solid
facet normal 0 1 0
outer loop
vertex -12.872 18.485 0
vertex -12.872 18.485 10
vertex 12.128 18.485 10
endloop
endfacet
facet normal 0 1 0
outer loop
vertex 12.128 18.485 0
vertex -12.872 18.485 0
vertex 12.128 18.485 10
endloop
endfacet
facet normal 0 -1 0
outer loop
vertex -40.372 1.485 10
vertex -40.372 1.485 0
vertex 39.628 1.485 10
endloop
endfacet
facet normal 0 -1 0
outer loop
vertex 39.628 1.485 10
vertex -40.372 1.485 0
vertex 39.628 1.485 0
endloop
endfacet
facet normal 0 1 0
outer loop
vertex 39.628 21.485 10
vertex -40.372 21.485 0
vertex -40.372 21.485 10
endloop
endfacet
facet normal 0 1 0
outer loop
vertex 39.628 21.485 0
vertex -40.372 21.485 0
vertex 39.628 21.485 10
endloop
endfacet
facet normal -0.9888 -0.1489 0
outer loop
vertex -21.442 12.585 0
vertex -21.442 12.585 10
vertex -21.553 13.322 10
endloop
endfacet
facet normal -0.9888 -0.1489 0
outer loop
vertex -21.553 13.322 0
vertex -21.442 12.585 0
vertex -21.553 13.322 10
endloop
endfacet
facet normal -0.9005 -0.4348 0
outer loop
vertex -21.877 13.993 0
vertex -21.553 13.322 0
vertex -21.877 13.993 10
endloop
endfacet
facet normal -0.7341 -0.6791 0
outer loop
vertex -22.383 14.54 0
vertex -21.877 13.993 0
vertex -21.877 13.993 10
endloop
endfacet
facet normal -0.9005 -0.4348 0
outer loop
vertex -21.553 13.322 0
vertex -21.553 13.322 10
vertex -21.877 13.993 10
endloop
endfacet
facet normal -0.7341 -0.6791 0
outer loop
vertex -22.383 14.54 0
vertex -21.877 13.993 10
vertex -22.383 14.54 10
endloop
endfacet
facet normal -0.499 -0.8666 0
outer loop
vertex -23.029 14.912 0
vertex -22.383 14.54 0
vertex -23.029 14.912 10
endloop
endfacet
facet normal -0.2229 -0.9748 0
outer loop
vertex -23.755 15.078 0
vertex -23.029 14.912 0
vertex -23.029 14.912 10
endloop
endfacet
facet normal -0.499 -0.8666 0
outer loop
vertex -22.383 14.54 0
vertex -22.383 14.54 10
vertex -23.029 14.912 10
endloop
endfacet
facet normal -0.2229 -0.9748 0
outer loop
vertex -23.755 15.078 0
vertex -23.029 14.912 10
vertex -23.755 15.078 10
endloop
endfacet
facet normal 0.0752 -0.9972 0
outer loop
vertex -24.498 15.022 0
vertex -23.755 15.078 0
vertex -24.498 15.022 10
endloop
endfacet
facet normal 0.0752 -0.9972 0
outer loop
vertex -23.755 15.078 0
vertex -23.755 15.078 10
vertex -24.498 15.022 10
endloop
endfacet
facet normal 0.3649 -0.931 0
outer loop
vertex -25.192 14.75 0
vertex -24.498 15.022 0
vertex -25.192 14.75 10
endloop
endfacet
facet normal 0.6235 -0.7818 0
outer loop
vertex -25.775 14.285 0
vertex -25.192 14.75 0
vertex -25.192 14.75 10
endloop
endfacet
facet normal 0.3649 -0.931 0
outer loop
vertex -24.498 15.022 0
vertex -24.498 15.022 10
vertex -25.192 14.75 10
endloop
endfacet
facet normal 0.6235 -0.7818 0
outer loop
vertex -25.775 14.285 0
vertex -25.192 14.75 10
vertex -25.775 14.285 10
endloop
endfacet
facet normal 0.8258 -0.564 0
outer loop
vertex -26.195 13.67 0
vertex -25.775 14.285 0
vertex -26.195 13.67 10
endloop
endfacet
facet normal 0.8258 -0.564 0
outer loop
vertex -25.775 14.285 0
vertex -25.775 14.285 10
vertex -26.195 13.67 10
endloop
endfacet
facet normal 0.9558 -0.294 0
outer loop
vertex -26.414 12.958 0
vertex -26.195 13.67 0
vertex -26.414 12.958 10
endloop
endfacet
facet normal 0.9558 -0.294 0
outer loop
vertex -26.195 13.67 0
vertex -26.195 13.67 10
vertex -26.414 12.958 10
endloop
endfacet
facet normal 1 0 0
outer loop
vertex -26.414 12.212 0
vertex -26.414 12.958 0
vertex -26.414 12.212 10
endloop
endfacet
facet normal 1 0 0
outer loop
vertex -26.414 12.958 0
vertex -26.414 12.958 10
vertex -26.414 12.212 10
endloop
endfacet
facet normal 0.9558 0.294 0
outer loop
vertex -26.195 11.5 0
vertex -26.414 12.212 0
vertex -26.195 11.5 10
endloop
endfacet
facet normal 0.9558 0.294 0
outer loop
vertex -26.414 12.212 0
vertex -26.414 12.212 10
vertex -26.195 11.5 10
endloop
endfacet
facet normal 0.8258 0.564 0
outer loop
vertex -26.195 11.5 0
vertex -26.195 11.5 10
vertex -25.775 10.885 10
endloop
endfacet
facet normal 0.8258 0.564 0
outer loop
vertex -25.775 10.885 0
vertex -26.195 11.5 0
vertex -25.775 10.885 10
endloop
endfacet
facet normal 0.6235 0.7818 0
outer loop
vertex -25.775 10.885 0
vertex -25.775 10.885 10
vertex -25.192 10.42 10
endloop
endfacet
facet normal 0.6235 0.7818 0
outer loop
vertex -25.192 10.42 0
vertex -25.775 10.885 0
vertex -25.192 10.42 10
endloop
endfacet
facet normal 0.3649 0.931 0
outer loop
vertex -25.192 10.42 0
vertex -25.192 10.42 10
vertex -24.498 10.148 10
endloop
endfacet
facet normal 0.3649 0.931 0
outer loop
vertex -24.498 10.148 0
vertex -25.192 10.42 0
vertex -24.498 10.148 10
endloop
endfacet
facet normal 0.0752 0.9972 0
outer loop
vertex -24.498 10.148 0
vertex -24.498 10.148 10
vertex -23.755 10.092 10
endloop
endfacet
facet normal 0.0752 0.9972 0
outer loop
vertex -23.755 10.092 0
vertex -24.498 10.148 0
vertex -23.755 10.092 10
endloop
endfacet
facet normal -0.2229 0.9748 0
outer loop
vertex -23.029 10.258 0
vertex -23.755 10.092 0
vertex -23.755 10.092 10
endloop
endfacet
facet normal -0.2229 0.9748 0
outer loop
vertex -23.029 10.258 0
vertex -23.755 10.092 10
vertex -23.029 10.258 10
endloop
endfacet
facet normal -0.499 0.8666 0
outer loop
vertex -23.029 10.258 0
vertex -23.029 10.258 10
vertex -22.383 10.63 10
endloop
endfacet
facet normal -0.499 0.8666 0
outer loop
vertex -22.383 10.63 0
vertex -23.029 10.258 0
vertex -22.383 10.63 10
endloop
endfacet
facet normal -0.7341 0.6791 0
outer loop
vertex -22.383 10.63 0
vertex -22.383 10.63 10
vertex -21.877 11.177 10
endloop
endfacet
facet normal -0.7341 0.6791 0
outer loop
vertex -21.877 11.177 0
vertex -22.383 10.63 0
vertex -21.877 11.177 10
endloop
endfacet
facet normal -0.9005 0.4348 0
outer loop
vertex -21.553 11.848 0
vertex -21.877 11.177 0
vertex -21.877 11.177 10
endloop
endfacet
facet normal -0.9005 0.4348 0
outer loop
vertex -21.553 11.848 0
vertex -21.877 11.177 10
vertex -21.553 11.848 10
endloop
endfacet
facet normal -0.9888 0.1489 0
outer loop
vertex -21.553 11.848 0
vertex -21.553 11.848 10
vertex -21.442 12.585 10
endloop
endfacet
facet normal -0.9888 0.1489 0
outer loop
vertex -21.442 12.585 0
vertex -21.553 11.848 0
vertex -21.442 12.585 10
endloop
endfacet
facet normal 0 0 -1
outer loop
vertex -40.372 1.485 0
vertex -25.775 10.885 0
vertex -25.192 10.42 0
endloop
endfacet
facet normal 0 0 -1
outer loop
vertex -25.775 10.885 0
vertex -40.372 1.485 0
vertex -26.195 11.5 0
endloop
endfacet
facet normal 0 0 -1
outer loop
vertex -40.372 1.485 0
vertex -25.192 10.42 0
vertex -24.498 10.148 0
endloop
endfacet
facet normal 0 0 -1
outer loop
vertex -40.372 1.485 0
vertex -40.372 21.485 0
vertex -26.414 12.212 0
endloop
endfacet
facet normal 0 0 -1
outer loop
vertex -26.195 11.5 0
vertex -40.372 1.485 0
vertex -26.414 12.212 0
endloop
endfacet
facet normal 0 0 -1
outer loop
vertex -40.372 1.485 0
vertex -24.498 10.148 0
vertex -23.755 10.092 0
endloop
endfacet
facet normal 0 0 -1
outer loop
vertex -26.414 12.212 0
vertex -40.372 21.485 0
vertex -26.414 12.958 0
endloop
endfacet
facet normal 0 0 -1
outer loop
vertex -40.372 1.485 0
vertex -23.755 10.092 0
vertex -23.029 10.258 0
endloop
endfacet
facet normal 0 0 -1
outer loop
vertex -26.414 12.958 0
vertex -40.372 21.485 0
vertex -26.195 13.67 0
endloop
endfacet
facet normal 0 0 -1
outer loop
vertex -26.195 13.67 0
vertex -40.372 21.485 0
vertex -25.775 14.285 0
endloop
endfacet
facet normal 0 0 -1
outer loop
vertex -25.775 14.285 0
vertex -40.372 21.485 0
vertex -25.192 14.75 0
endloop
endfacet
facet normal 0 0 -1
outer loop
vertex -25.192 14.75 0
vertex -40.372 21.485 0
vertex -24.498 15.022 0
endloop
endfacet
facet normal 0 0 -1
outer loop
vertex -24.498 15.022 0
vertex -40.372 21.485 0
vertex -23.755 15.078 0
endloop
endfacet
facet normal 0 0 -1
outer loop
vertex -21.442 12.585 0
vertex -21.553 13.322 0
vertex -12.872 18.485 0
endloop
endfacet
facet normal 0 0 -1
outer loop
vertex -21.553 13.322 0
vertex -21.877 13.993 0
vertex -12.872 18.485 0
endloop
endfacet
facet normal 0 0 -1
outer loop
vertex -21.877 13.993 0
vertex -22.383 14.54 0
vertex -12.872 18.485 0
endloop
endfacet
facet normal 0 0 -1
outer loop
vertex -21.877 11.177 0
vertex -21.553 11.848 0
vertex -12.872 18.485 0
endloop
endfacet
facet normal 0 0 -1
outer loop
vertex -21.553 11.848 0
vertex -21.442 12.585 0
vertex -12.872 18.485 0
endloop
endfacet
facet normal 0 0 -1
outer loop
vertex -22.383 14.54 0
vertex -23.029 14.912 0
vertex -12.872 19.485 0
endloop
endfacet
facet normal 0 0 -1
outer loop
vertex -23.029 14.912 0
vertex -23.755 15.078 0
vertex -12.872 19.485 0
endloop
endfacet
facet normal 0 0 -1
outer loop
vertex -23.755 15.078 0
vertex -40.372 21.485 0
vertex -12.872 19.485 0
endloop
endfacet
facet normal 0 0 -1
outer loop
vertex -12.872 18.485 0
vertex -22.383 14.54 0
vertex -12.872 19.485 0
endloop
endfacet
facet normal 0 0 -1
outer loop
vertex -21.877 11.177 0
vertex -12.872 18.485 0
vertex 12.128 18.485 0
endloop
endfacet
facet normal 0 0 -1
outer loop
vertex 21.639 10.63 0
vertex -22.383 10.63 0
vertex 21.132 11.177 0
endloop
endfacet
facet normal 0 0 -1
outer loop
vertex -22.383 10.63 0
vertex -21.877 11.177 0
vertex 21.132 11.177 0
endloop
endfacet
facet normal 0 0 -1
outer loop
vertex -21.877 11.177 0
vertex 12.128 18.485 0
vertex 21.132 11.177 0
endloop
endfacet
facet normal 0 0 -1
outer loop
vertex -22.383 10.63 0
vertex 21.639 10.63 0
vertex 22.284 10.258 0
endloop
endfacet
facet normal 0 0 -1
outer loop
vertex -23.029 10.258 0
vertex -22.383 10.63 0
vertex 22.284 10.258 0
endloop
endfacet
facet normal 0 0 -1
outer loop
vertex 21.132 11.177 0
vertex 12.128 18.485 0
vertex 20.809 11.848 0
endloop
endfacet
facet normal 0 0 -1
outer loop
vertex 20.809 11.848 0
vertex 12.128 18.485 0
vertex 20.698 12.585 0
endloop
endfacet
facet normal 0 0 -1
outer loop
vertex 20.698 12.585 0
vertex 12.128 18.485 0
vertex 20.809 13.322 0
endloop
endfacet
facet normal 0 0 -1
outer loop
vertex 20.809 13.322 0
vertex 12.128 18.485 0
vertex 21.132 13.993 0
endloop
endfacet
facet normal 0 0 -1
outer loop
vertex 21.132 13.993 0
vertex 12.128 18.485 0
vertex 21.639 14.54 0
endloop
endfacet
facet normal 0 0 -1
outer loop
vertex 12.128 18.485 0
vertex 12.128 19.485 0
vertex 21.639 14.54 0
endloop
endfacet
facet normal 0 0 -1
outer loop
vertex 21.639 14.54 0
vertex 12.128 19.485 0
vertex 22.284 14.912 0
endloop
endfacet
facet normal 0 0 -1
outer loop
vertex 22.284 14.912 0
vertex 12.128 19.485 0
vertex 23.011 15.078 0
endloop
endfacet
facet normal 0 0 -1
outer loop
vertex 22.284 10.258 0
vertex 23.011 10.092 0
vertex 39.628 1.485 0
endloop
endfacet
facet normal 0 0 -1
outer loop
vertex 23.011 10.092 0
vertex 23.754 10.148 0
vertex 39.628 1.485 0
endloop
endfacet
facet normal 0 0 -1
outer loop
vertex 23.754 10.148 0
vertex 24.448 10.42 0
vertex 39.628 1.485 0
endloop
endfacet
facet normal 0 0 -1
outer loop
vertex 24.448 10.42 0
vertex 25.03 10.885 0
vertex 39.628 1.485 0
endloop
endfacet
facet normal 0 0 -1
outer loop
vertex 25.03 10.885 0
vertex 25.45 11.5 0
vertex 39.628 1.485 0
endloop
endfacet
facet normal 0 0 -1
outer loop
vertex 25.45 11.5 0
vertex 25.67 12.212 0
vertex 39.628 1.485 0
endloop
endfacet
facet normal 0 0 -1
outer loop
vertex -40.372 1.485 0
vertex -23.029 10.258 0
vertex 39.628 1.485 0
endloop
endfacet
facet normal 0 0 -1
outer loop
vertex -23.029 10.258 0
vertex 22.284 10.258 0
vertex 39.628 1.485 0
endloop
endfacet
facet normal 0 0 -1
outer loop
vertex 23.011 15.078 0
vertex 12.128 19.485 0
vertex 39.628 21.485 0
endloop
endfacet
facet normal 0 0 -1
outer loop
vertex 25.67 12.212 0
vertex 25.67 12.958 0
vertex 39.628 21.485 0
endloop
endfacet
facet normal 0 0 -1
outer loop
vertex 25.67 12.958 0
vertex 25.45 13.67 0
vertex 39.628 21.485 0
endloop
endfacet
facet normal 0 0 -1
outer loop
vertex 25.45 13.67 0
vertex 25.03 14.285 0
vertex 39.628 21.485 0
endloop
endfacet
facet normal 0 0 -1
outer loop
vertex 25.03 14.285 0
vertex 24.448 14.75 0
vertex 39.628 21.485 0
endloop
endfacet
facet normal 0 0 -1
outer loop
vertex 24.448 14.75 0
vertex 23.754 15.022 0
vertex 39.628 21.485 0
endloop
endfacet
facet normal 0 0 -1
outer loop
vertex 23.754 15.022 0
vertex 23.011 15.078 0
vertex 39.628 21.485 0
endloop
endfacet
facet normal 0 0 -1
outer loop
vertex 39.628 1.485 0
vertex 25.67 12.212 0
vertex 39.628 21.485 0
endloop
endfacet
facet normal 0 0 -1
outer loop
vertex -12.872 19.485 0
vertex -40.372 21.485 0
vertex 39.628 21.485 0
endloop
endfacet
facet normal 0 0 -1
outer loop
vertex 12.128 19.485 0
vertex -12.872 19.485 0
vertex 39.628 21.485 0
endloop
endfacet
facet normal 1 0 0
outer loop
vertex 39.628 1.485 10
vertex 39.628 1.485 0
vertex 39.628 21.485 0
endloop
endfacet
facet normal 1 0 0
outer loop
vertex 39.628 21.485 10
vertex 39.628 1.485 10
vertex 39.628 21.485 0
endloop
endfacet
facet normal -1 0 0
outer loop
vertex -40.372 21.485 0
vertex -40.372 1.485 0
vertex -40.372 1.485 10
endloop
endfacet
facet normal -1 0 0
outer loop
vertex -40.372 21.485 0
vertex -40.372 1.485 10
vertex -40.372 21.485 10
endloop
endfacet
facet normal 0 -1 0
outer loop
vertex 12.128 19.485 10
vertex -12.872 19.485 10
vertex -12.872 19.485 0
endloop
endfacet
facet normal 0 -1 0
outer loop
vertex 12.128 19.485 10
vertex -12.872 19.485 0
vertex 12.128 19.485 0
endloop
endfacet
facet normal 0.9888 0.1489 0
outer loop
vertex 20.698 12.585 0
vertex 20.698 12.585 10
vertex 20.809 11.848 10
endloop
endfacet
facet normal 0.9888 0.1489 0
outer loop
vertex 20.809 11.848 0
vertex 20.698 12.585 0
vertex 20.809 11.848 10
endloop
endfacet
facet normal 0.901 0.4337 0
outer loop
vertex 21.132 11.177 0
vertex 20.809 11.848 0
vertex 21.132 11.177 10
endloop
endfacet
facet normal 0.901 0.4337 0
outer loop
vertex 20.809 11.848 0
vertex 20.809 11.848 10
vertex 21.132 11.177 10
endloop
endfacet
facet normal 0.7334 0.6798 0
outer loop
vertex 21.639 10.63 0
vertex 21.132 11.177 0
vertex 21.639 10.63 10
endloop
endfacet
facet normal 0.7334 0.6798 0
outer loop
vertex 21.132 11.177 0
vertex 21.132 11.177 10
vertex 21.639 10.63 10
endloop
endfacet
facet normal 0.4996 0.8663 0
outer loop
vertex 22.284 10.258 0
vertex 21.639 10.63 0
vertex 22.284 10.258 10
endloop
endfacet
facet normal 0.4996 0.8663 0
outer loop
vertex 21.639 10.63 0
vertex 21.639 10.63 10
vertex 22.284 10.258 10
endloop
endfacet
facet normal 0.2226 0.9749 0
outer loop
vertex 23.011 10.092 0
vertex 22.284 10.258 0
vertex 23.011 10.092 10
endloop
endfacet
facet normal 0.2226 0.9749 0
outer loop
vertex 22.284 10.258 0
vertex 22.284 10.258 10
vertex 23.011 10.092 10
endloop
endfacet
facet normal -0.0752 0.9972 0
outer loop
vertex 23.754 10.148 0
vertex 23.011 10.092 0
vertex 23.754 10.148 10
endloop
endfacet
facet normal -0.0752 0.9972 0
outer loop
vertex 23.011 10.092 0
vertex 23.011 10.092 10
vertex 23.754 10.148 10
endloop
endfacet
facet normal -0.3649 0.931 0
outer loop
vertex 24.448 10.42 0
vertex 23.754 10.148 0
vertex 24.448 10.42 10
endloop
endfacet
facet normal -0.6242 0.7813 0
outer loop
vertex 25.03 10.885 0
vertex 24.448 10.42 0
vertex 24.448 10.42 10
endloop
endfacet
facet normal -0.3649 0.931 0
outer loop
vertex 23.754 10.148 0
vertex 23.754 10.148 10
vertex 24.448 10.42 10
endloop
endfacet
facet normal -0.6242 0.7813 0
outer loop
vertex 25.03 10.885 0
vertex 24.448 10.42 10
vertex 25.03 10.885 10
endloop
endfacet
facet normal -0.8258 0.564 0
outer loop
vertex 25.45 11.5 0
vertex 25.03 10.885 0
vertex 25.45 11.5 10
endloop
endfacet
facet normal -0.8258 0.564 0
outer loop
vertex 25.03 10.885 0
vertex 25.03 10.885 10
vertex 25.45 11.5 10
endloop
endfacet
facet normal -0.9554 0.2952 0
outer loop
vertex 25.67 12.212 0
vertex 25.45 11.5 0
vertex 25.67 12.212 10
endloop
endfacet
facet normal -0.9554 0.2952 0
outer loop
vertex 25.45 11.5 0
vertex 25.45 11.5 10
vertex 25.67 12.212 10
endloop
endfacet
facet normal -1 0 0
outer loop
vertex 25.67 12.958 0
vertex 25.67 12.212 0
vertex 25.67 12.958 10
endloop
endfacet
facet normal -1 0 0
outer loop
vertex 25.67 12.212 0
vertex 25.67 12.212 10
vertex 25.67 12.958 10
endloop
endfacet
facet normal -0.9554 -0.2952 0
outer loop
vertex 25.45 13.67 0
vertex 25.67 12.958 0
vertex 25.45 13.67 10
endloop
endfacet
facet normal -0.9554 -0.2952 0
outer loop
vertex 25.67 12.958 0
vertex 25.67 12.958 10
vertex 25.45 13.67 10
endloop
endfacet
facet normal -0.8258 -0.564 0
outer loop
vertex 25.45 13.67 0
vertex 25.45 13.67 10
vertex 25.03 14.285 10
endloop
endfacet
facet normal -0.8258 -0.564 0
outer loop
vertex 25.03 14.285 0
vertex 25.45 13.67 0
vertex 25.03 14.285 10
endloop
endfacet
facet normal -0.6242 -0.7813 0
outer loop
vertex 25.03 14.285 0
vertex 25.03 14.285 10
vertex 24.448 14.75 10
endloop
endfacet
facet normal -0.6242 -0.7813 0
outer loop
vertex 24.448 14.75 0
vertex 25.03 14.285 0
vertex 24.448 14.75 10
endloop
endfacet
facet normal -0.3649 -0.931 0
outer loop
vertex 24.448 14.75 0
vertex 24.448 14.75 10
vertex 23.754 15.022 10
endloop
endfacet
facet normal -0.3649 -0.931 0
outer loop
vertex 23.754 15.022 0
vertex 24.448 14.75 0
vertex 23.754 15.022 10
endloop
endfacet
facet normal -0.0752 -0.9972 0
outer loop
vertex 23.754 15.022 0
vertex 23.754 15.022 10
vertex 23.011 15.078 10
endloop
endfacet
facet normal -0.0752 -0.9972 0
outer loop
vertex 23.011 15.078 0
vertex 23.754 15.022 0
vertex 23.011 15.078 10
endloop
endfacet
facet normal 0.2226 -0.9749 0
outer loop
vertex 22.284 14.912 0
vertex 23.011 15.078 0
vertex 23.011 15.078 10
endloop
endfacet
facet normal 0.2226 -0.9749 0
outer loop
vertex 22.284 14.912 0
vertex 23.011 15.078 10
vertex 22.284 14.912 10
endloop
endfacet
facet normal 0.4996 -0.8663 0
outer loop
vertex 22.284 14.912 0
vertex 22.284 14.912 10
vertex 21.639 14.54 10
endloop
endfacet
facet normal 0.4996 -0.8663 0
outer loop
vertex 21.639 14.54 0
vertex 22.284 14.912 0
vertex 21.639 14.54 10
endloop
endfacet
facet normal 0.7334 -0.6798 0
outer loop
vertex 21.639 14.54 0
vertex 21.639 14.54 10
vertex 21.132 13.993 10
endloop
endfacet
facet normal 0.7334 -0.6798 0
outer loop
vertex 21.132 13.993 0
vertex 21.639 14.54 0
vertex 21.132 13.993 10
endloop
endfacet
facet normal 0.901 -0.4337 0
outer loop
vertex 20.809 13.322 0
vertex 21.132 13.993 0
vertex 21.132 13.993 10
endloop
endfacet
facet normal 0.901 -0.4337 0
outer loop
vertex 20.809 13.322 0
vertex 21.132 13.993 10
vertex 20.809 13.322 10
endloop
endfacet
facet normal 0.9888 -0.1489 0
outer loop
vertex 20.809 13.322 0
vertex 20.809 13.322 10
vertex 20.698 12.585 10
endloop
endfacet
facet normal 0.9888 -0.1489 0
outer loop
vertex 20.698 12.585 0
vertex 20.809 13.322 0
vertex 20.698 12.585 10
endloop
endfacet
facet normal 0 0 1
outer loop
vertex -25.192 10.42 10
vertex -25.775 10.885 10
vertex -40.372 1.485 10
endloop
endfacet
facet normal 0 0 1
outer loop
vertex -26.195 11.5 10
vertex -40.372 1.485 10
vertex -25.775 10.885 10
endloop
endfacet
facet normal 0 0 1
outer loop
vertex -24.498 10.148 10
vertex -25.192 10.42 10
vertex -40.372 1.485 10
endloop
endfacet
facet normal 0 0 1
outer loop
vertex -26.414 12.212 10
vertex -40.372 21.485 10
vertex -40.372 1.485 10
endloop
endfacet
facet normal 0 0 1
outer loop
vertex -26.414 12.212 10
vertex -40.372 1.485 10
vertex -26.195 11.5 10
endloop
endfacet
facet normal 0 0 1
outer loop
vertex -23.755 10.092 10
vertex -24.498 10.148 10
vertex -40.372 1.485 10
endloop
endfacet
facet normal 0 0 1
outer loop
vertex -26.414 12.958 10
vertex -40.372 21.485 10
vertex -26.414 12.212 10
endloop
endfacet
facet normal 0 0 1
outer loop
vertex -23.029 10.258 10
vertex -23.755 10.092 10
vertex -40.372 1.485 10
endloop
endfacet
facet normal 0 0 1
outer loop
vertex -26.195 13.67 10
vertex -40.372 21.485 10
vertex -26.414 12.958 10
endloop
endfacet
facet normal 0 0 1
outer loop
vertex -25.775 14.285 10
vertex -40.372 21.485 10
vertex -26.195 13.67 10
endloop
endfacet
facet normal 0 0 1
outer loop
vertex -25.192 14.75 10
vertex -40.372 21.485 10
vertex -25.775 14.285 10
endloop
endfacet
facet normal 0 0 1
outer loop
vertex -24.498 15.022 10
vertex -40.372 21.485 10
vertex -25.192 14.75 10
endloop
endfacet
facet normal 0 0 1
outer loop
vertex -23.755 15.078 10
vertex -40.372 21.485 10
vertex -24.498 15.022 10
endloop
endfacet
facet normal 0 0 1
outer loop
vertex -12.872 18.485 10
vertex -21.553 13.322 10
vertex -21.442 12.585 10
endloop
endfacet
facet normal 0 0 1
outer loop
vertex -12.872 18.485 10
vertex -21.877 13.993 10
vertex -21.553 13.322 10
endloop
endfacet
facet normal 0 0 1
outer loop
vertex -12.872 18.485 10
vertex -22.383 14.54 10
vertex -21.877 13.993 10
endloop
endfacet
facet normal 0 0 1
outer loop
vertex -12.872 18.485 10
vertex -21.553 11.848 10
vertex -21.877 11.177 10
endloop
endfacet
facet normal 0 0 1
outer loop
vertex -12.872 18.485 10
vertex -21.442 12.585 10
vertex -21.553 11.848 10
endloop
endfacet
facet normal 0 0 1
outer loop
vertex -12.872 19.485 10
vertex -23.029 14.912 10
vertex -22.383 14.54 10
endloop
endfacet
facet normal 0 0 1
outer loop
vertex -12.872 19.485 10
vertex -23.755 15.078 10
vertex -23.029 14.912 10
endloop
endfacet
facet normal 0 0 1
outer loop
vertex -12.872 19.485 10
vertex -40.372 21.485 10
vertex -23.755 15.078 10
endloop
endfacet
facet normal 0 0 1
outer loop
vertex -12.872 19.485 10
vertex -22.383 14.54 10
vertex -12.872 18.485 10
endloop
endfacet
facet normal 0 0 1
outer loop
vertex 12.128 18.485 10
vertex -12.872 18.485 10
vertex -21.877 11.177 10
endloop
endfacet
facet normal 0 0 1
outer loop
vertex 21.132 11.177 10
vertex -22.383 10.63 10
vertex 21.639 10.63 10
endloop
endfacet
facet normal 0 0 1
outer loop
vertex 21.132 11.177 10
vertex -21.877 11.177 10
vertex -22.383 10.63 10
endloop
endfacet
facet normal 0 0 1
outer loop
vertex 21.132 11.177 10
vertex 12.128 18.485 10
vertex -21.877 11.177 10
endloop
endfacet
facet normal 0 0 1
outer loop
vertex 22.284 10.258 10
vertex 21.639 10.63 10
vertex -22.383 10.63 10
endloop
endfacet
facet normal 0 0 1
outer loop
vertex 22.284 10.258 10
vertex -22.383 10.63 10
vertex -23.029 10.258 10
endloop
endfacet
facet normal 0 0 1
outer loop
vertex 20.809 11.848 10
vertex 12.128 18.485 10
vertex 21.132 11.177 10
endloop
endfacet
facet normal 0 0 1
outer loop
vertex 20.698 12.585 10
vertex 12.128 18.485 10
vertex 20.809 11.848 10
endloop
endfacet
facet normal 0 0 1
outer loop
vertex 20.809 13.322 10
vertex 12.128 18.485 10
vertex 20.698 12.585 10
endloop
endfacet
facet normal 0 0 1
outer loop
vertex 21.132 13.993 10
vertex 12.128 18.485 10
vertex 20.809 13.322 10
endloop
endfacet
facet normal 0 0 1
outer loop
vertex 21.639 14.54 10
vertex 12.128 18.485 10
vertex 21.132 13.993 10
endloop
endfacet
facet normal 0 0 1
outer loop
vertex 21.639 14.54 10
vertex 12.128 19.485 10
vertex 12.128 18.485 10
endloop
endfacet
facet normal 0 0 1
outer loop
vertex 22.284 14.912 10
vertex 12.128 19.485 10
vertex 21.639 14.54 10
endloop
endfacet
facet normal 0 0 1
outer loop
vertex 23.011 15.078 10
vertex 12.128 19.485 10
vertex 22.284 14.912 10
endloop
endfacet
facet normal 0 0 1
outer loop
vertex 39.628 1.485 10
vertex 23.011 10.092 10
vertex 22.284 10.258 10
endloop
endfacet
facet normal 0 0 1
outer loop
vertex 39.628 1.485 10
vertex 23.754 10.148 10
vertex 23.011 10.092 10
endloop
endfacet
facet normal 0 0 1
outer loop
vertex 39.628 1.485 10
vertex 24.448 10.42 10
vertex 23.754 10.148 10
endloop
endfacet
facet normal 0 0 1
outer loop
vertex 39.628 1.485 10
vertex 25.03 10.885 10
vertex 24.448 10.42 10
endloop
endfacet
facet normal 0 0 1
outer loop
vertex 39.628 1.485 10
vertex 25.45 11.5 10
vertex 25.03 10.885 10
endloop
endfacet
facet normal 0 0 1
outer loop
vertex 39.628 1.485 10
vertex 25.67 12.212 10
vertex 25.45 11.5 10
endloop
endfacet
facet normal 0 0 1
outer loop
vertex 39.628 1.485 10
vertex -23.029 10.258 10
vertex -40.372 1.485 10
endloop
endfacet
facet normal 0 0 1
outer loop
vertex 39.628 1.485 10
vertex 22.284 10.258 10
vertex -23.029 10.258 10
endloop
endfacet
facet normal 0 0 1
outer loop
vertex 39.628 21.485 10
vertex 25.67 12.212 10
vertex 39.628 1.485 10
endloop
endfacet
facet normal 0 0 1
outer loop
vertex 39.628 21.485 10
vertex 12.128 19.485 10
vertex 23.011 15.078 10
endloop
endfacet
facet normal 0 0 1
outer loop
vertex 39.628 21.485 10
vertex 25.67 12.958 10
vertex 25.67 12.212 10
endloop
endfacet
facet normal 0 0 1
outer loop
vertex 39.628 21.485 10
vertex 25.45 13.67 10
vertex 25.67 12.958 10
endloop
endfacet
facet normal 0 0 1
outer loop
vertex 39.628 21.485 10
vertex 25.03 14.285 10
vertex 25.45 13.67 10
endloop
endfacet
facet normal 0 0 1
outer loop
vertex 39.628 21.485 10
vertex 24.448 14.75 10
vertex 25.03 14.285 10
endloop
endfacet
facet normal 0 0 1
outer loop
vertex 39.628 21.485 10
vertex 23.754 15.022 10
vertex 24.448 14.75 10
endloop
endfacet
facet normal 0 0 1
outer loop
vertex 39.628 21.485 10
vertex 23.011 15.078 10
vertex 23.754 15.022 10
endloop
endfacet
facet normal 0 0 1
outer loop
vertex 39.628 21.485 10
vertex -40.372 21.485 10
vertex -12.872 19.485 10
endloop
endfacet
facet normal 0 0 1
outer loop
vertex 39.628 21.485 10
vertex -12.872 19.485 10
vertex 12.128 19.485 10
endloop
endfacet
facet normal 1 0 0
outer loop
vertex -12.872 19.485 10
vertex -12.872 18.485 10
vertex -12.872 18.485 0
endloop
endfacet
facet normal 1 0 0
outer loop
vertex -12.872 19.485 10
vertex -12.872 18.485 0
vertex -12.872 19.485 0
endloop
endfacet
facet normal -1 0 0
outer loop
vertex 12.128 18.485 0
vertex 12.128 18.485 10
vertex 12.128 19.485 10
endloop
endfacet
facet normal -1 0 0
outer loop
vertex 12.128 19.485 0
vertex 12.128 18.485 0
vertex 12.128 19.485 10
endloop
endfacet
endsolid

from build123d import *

# Parameters (mm, degrees)
SKETCH1_W           = 80
SKETCH1_H           = 20
BOSS_EXTRUDE1_DEPTH = 10
SKETCH2_R           = 2.5
CUT_EXTRUDE1_DEPTH  = 47.813641243
SKETCH3_W           = 25
SKETCH3_H           = 1
CUT_EXTRUDE2_DEPTH  = 47.813641243


with BuildPart() as part:
    # Sketch1 → Boss-Extrude1 (new body)
    with BuildSketch(Plane.XY):
        with Locations((-0.372188153, 11.484958231)):
            Rectangle(SKETCH1_W, SKETCH1_H)
    extrude(amount=BOSS_EXTRUDE1_DEPTH)

    # Sketch2 → Cut-Extrude1 (cut, through all)
    with BuildSketch(Plane.XY.offset(10)):
        with Locations((-23.942188153, 12.584958231)):
            Circle(SKETCH2_R)
        with Locations(Location((23.197811847, 12.584958231, 0), (0, 0, 180))):
            Circle(SKETCH2_R)
    extrude(amount=-CUT_EXTRUDE1_DEPTH, mode=Mode.SUBTRACT)

    # Sketch3 → Cut-Extrude2 (cut, through all)
    with BuildSketch(Plane.XY.offset(10)):
        with Locations((-0.372188153, 18.984958231)):
            Rectangle(SKETCH3_W, SKETCH3_H)
    extrude(amount=-CUT_EXTRUDE2_DEPTH, mode=Mode.SUBTRACT)


solid = part.part
